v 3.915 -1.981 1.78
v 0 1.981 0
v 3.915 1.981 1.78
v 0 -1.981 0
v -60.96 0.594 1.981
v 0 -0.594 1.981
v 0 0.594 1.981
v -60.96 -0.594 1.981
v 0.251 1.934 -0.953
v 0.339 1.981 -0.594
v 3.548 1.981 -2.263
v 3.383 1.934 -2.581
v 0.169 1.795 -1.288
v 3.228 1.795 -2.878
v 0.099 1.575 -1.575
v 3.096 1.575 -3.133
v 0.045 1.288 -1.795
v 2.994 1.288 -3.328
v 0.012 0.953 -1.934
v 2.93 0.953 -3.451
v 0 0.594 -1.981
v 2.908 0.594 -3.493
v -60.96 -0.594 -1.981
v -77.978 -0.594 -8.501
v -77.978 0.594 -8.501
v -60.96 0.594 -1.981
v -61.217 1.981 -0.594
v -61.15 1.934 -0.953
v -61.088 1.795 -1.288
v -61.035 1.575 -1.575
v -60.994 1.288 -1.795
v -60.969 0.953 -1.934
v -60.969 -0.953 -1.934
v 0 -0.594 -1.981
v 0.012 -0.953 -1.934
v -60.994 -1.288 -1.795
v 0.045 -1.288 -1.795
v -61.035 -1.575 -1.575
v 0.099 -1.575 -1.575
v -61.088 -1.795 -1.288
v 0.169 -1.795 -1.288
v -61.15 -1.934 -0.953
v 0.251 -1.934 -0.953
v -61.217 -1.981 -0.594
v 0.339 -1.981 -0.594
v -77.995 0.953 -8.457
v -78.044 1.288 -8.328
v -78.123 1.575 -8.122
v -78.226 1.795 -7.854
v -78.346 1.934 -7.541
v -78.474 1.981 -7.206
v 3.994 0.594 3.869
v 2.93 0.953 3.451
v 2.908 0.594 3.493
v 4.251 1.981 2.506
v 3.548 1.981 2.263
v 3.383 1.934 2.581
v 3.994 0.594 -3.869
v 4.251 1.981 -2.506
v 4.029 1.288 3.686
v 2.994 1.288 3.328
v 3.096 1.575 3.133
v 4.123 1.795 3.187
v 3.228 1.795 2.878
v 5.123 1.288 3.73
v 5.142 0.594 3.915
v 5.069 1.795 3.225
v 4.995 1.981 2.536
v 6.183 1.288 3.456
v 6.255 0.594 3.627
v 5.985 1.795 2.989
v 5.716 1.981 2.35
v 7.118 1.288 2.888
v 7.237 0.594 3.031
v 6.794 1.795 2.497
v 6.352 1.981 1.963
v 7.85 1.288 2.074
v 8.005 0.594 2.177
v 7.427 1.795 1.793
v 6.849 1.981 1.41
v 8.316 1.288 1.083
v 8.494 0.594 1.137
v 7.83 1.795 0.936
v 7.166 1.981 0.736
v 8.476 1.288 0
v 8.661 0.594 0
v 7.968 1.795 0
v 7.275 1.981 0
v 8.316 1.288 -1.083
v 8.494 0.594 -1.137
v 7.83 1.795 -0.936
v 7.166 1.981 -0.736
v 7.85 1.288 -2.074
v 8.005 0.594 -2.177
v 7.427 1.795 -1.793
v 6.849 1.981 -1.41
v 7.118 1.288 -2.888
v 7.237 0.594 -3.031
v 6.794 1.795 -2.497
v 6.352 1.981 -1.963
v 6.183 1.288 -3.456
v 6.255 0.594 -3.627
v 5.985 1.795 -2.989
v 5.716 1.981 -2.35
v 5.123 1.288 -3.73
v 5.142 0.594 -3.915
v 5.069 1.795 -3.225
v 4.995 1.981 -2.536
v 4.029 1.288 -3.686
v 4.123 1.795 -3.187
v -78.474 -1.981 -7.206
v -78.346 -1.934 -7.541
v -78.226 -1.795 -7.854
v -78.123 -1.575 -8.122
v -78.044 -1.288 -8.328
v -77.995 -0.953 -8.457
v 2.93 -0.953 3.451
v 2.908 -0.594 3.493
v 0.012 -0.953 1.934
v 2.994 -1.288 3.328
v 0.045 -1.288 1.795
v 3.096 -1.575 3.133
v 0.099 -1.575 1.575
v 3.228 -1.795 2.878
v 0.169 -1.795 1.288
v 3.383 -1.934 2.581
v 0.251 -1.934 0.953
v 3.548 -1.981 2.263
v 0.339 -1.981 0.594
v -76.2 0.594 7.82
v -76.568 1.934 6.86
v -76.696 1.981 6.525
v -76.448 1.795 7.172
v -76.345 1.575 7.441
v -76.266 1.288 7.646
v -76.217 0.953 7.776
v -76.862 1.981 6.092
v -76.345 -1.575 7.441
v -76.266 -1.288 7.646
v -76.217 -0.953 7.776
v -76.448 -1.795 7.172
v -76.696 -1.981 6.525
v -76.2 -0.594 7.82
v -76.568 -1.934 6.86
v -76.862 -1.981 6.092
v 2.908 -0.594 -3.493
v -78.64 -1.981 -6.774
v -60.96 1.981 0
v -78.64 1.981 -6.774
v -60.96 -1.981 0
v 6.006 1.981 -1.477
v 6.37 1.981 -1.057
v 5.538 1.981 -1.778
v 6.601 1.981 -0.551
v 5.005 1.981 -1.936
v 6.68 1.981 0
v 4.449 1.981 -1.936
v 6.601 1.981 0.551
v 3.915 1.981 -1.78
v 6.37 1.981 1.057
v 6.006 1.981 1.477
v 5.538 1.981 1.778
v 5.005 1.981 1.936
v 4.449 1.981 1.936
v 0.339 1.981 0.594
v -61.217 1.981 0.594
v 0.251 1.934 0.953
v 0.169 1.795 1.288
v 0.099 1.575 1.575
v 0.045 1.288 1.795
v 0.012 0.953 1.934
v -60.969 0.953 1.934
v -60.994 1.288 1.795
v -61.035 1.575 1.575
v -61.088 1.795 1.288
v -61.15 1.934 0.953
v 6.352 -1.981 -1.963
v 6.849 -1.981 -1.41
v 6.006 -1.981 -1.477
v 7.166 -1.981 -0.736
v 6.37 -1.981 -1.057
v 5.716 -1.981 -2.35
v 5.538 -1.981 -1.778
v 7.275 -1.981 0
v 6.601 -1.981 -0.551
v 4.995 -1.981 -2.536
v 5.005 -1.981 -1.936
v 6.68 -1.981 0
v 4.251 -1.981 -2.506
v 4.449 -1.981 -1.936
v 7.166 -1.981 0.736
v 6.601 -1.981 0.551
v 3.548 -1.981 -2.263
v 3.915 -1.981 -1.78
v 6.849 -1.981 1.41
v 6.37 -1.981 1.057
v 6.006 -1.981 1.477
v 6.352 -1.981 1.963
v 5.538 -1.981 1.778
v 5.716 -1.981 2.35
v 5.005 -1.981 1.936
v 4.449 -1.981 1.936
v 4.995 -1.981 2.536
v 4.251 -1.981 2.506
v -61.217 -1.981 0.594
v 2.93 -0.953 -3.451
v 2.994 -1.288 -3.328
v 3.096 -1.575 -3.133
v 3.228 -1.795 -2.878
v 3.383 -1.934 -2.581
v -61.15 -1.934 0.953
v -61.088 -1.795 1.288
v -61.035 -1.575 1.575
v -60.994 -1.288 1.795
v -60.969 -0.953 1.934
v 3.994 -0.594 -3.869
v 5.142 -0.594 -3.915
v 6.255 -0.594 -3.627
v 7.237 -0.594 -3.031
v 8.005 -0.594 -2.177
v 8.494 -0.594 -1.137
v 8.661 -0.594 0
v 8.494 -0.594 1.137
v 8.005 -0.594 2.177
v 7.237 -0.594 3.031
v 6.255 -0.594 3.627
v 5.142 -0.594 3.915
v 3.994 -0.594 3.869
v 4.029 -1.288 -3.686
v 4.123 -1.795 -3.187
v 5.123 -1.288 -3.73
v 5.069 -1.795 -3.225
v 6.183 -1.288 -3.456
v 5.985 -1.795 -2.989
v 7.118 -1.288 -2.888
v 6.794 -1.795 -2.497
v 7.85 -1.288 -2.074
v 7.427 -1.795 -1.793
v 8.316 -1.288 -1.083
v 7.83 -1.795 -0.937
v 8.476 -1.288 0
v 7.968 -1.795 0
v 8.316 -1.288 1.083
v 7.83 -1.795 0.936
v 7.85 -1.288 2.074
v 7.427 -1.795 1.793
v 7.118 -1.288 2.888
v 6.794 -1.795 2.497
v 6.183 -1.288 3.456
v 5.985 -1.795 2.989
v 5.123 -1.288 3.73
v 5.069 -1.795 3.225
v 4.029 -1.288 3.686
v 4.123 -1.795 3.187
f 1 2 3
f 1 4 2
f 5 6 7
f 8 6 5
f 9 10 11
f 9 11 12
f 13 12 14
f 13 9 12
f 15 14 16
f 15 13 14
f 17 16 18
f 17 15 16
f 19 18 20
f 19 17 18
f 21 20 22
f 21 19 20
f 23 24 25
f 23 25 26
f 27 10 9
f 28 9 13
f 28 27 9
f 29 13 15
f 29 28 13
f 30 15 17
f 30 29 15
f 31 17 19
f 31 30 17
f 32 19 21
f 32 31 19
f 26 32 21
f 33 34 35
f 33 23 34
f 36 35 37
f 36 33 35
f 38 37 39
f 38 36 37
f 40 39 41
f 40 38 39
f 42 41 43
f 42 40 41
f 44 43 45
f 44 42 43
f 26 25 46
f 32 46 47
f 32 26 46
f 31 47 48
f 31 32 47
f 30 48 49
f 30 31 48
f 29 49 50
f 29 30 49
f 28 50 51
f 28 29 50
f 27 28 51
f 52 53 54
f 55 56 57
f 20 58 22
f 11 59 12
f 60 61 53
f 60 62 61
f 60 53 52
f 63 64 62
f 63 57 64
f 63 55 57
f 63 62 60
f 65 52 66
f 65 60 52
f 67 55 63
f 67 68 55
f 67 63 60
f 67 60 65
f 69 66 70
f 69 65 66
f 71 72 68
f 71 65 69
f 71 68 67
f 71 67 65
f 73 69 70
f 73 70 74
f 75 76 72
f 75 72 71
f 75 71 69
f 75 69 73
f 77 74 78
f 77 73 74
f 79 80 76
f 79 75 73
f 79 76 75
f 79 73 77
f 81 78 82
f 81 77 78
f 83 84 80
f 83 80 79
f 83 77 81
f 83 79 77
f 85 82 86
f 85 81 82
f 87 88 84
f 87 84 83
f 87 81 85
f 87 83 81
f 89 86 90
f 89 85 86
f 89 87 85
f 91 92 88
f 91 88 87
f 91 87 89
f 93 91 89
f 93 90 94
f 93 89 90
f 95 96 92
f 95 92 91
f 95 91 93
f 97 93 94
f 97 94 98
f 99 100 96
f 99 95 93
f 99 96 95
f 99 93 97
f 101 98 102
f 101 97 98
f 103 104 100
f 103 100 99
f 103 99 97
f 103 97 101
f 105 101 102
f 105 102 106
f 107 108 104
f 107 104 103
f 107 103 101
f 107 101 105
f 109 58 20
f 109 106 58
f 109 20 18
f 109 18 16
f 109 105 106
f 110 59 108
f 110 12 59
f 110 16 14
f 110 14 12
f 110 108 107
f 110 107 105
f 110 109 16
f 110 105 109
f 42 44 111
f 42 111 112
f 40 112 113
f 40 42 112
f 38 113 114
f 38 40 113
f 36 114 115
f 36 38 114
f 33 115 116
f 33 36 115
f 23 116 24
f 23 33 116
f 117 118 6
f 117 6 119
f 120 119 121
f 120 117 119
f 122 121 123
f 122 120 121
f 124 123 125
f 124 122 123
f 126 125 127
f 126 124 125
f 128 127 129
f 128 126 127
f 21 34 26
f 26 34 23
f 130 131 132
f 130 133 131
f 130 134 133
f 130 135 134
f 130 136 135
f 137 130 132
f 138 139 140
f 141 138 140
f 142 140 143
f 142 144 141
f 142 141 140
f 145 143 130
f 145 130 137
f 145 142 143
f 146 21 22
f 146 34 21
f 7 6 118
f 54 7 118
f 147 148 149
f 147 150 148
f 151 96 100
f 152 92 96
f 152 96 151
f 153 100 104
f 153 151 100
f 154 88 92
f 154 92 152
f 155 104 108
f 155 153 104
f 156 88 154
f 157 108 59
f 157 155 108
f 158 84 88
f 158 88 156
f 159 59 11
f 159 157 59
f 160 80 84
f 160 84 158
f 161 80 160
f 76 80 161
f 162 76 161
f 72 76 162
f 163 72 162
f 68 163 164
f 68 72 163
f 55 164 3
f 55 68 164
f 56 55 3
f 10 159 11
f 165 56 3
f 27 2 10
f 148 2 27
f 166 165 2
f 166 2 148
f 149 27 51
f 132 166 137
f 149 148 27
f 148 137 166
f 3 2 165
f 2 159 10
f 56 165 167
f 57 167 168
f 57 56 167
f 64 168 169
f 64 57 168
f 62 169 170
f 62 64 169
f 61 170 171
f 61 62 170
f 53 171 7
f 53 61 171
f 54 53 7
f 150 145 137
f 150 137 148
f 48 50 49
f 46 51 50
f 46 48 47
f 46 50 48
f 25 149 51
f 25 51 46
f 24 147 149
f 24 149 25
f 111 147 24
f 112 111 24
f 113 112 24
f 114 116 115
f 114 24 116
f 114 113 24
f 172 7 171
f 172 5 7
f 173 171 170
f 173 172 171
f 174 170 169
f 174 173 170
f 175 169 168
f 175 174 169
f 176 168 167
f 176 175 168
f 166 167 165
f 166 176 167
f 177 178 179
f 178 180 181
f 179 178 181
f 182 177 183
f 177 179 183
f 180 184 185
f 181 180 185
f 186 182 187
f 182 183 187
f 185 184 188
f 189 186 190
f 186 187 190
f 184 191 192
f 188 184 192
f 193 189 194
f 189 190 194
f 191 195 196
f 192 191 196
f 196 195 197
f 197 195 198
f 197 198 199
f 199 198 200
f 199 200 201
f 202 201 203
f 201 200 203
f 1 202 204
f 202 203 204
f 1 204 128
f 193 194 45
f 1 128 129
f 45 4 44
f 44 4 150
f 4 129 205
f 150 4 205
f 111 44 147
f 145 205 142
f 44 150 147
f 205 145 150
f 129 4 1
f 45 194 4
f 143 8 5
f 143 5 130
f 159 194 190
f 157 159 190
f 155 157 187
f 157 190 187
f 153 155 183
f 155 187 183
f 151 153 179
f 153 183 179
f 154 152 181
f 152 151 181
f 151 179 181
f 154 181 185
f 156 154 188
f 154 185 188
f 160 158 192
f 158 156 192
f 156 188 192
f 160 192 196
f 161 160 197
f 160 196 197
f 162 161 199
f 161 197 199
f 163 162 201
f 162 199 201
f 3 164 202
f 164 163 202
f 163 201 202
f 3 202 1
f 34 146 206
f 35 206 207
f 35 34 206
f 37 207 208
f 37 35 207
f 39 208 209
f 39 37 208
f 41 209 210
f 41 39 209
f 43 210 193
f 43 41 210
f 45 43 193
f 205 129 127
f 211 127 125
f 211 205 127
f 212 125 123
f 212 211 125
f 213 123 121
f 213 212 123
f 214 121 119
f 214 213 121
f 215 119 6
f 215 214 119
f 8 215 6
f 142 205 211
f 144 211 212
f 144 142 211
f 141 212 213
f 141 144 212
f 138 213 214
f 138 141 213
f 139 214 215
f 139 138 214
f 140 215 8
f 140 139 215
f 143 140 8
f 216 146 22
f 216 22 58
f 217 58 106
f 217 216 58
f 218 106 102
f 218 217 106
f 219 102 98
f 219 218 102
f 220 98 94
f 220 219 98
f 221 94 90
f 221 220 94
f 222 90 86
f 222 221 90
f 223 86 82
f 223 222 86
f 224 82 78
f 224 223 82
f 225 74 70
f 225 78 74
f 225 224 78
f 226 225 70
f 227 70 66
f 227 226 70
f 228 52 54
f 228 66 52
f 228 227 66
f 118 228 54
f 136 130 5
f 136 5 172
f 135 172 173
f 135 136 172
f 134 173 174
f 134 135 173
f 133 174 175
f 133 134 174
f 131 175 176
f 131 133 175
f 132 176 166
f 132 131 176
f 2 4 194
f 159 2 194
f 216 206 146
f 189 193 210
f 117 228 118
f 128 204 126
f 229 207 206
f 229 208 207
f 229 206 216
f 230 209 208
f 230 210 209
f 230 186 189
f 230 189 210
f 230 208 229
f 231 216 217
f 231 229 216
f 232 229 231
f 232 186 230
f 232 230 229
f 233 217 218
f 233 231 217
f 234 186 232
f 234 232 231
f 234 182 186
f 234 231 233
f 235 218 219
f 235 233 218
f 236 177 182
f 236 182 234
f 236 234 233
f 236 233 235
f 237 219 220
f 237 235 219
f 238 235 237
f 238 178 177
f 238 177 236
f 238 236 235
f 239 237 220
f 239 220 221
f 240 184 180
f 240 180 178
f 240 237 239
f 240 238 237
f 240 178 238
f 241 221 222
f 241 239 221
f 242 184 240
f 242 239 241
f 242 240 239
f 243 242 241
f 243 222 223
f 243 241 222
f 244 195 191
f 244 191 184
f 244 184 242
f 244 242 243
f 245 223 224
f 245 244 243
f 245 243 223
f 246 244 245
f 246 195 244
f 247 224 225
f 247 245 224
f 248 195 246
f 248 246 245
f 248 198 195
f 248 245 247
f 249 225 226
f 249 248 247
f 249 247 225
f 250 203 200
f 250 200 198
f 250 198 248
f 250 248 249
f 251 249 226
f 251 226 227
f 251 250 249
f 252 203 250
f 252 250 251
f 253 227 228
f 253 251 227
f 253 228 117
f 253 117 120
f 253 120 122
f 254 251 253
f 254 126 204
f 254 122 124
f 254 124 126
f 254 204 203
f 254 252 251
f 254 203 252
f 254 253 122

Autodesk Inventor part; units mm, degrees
ref_plane "YZ Plane" through (0, 0, 0) normal (1, 0, 0) x (0, 1, 0)
sketch "Esquisse1" plane through (0, 0, 0) normal (0, 1, 0) x (-1, 0, 0)
  arc A0 (-2.9084, 3.4932) -> (-2.9084, -3.4932) centre (-4.7244, 0) ccw
  arc A1 (-3.9147, 1.7803) -> (-3.9147, -1.7803) centre (-4.7244, 0) ccw
  line L0 (0, 1.9812) -> (60.96, 1.9812)
  line L1 (0, -1.9812) -> (60.96, -1.9812)
  line L2 (60.96, 1.9812) -> (76.2, 7.8199)
  line L3 (76.2, 7.8199) -> (76.8619, 6.0923)
  line L4 (76.8619, 6.0923) -> (60.96, 0)
  line L5 (60.96, 0) -> (78.6399, -6.7735)
  line L6 (78.6399, -6.7735) -> (77.978, -8.5011)
  line L7 (77.978, -8.5011) -> (60.96, -1.9812)
  line L8 (0, 0) -> (-3.9147, -1.7803)
  line L9 (0, 0) -> (-3.9147, 1.7803)
  line L10 (0, 1.9812) -> (0, -1.9812) construction
  line L11 (0, 1.9812) -> (-2.9084, 3.4932)
  line L12 (0, -1.9812) -> (-2.9084, -3.4932)
  line L13 (-8.6614, 0) -> (60.96, 0) construction
  line L14 (60.96, 1.9812) -> (60.96, -1.9812) construction
  dimension "d0" = 60.96
  dimension "d1" = 76.2
  dimension "d2" = 159.037
  dimension "d3" = 159.037
  dimension "d4" = 1.778
  dimension "d5" = 1.9558
  dimension "d6" = 3.937
  dimension "d7" = 1.9812
  dimension "d8" = 1.9812
  dimension "d9" = 4.7244
extrude "Corps" add sketch "Esquisse1" along normal mid plane 3.9624
fillet "Congé" radius 1.3868 14 edges at (-68.58, -1.9812, 4.9006) (-68.58, 1.9812, 4.9006) (-30.48, -1.9812, 1.9812) (-30.48, 1.9812, 1.9812) (8.6614, -1.9812, 0) (1.4542, -1.9812, -2.7372) (1.4542, -1.9812, 2.7372) (8.6614, 1.9812, 0) (1.4542, 1.9812, 2.7372) (1.4542, 1.9812, -2.7372) (-30.48, -1.9812, -1.9812) (-69.469, -1.9812, -5.2412) (-30.48, 1.9812, -1.9812) (-69.469, 1.9812, -5.2412)
ref_plane "Work Plane1" through (0, -10, 0) normal (0, 0, -1) x (0, 1, 0)
ref_plane "Work Plane3" through (0, 0, 1.9812) normal (-1, 0, 0) x (0, 1, 0)
equation "\"d0\" = MSIAB"
equation "\"d1\" = SNLG"
equation "\"d4\" = LGDIF"
equation "\"d5\" = -0.5 * SNND1 + 0.5 * KBR"
equation "\"d6\" = 0.5 * KBR"
equation "\"d7\" = 0.5 * SNND1"
equation "\"d8\" = 0.5 * SNND1"
equation "\"d9\" = KOL - 0.5 * KBR"
equation "\"d10\" = SNND1"
equation "\"d12\" = 0.35 * SNND1"
equation "\"SNND\" = 3.96875"
equation "\"SNLG\" = 76.2"
equation "\"SNND1\" = 3.9624"
equation "\"KBR\" = 7.874"
equation "\"KOL\" = 8.6614"
equation "\"LGDIF\" = 1.778"
equation "\"MSIAB\" = 60.96"
equation "\"NNDMAX\" = 22.225"
equation "\"DSH\" = 5.953"
equation "\"NNDMIN\" = 15.875"
equation "\"SPBOR\" = 4.3688"
properties part number "SAE J487a - 5/32 x 3   Type fourche" material "Acier doux"
